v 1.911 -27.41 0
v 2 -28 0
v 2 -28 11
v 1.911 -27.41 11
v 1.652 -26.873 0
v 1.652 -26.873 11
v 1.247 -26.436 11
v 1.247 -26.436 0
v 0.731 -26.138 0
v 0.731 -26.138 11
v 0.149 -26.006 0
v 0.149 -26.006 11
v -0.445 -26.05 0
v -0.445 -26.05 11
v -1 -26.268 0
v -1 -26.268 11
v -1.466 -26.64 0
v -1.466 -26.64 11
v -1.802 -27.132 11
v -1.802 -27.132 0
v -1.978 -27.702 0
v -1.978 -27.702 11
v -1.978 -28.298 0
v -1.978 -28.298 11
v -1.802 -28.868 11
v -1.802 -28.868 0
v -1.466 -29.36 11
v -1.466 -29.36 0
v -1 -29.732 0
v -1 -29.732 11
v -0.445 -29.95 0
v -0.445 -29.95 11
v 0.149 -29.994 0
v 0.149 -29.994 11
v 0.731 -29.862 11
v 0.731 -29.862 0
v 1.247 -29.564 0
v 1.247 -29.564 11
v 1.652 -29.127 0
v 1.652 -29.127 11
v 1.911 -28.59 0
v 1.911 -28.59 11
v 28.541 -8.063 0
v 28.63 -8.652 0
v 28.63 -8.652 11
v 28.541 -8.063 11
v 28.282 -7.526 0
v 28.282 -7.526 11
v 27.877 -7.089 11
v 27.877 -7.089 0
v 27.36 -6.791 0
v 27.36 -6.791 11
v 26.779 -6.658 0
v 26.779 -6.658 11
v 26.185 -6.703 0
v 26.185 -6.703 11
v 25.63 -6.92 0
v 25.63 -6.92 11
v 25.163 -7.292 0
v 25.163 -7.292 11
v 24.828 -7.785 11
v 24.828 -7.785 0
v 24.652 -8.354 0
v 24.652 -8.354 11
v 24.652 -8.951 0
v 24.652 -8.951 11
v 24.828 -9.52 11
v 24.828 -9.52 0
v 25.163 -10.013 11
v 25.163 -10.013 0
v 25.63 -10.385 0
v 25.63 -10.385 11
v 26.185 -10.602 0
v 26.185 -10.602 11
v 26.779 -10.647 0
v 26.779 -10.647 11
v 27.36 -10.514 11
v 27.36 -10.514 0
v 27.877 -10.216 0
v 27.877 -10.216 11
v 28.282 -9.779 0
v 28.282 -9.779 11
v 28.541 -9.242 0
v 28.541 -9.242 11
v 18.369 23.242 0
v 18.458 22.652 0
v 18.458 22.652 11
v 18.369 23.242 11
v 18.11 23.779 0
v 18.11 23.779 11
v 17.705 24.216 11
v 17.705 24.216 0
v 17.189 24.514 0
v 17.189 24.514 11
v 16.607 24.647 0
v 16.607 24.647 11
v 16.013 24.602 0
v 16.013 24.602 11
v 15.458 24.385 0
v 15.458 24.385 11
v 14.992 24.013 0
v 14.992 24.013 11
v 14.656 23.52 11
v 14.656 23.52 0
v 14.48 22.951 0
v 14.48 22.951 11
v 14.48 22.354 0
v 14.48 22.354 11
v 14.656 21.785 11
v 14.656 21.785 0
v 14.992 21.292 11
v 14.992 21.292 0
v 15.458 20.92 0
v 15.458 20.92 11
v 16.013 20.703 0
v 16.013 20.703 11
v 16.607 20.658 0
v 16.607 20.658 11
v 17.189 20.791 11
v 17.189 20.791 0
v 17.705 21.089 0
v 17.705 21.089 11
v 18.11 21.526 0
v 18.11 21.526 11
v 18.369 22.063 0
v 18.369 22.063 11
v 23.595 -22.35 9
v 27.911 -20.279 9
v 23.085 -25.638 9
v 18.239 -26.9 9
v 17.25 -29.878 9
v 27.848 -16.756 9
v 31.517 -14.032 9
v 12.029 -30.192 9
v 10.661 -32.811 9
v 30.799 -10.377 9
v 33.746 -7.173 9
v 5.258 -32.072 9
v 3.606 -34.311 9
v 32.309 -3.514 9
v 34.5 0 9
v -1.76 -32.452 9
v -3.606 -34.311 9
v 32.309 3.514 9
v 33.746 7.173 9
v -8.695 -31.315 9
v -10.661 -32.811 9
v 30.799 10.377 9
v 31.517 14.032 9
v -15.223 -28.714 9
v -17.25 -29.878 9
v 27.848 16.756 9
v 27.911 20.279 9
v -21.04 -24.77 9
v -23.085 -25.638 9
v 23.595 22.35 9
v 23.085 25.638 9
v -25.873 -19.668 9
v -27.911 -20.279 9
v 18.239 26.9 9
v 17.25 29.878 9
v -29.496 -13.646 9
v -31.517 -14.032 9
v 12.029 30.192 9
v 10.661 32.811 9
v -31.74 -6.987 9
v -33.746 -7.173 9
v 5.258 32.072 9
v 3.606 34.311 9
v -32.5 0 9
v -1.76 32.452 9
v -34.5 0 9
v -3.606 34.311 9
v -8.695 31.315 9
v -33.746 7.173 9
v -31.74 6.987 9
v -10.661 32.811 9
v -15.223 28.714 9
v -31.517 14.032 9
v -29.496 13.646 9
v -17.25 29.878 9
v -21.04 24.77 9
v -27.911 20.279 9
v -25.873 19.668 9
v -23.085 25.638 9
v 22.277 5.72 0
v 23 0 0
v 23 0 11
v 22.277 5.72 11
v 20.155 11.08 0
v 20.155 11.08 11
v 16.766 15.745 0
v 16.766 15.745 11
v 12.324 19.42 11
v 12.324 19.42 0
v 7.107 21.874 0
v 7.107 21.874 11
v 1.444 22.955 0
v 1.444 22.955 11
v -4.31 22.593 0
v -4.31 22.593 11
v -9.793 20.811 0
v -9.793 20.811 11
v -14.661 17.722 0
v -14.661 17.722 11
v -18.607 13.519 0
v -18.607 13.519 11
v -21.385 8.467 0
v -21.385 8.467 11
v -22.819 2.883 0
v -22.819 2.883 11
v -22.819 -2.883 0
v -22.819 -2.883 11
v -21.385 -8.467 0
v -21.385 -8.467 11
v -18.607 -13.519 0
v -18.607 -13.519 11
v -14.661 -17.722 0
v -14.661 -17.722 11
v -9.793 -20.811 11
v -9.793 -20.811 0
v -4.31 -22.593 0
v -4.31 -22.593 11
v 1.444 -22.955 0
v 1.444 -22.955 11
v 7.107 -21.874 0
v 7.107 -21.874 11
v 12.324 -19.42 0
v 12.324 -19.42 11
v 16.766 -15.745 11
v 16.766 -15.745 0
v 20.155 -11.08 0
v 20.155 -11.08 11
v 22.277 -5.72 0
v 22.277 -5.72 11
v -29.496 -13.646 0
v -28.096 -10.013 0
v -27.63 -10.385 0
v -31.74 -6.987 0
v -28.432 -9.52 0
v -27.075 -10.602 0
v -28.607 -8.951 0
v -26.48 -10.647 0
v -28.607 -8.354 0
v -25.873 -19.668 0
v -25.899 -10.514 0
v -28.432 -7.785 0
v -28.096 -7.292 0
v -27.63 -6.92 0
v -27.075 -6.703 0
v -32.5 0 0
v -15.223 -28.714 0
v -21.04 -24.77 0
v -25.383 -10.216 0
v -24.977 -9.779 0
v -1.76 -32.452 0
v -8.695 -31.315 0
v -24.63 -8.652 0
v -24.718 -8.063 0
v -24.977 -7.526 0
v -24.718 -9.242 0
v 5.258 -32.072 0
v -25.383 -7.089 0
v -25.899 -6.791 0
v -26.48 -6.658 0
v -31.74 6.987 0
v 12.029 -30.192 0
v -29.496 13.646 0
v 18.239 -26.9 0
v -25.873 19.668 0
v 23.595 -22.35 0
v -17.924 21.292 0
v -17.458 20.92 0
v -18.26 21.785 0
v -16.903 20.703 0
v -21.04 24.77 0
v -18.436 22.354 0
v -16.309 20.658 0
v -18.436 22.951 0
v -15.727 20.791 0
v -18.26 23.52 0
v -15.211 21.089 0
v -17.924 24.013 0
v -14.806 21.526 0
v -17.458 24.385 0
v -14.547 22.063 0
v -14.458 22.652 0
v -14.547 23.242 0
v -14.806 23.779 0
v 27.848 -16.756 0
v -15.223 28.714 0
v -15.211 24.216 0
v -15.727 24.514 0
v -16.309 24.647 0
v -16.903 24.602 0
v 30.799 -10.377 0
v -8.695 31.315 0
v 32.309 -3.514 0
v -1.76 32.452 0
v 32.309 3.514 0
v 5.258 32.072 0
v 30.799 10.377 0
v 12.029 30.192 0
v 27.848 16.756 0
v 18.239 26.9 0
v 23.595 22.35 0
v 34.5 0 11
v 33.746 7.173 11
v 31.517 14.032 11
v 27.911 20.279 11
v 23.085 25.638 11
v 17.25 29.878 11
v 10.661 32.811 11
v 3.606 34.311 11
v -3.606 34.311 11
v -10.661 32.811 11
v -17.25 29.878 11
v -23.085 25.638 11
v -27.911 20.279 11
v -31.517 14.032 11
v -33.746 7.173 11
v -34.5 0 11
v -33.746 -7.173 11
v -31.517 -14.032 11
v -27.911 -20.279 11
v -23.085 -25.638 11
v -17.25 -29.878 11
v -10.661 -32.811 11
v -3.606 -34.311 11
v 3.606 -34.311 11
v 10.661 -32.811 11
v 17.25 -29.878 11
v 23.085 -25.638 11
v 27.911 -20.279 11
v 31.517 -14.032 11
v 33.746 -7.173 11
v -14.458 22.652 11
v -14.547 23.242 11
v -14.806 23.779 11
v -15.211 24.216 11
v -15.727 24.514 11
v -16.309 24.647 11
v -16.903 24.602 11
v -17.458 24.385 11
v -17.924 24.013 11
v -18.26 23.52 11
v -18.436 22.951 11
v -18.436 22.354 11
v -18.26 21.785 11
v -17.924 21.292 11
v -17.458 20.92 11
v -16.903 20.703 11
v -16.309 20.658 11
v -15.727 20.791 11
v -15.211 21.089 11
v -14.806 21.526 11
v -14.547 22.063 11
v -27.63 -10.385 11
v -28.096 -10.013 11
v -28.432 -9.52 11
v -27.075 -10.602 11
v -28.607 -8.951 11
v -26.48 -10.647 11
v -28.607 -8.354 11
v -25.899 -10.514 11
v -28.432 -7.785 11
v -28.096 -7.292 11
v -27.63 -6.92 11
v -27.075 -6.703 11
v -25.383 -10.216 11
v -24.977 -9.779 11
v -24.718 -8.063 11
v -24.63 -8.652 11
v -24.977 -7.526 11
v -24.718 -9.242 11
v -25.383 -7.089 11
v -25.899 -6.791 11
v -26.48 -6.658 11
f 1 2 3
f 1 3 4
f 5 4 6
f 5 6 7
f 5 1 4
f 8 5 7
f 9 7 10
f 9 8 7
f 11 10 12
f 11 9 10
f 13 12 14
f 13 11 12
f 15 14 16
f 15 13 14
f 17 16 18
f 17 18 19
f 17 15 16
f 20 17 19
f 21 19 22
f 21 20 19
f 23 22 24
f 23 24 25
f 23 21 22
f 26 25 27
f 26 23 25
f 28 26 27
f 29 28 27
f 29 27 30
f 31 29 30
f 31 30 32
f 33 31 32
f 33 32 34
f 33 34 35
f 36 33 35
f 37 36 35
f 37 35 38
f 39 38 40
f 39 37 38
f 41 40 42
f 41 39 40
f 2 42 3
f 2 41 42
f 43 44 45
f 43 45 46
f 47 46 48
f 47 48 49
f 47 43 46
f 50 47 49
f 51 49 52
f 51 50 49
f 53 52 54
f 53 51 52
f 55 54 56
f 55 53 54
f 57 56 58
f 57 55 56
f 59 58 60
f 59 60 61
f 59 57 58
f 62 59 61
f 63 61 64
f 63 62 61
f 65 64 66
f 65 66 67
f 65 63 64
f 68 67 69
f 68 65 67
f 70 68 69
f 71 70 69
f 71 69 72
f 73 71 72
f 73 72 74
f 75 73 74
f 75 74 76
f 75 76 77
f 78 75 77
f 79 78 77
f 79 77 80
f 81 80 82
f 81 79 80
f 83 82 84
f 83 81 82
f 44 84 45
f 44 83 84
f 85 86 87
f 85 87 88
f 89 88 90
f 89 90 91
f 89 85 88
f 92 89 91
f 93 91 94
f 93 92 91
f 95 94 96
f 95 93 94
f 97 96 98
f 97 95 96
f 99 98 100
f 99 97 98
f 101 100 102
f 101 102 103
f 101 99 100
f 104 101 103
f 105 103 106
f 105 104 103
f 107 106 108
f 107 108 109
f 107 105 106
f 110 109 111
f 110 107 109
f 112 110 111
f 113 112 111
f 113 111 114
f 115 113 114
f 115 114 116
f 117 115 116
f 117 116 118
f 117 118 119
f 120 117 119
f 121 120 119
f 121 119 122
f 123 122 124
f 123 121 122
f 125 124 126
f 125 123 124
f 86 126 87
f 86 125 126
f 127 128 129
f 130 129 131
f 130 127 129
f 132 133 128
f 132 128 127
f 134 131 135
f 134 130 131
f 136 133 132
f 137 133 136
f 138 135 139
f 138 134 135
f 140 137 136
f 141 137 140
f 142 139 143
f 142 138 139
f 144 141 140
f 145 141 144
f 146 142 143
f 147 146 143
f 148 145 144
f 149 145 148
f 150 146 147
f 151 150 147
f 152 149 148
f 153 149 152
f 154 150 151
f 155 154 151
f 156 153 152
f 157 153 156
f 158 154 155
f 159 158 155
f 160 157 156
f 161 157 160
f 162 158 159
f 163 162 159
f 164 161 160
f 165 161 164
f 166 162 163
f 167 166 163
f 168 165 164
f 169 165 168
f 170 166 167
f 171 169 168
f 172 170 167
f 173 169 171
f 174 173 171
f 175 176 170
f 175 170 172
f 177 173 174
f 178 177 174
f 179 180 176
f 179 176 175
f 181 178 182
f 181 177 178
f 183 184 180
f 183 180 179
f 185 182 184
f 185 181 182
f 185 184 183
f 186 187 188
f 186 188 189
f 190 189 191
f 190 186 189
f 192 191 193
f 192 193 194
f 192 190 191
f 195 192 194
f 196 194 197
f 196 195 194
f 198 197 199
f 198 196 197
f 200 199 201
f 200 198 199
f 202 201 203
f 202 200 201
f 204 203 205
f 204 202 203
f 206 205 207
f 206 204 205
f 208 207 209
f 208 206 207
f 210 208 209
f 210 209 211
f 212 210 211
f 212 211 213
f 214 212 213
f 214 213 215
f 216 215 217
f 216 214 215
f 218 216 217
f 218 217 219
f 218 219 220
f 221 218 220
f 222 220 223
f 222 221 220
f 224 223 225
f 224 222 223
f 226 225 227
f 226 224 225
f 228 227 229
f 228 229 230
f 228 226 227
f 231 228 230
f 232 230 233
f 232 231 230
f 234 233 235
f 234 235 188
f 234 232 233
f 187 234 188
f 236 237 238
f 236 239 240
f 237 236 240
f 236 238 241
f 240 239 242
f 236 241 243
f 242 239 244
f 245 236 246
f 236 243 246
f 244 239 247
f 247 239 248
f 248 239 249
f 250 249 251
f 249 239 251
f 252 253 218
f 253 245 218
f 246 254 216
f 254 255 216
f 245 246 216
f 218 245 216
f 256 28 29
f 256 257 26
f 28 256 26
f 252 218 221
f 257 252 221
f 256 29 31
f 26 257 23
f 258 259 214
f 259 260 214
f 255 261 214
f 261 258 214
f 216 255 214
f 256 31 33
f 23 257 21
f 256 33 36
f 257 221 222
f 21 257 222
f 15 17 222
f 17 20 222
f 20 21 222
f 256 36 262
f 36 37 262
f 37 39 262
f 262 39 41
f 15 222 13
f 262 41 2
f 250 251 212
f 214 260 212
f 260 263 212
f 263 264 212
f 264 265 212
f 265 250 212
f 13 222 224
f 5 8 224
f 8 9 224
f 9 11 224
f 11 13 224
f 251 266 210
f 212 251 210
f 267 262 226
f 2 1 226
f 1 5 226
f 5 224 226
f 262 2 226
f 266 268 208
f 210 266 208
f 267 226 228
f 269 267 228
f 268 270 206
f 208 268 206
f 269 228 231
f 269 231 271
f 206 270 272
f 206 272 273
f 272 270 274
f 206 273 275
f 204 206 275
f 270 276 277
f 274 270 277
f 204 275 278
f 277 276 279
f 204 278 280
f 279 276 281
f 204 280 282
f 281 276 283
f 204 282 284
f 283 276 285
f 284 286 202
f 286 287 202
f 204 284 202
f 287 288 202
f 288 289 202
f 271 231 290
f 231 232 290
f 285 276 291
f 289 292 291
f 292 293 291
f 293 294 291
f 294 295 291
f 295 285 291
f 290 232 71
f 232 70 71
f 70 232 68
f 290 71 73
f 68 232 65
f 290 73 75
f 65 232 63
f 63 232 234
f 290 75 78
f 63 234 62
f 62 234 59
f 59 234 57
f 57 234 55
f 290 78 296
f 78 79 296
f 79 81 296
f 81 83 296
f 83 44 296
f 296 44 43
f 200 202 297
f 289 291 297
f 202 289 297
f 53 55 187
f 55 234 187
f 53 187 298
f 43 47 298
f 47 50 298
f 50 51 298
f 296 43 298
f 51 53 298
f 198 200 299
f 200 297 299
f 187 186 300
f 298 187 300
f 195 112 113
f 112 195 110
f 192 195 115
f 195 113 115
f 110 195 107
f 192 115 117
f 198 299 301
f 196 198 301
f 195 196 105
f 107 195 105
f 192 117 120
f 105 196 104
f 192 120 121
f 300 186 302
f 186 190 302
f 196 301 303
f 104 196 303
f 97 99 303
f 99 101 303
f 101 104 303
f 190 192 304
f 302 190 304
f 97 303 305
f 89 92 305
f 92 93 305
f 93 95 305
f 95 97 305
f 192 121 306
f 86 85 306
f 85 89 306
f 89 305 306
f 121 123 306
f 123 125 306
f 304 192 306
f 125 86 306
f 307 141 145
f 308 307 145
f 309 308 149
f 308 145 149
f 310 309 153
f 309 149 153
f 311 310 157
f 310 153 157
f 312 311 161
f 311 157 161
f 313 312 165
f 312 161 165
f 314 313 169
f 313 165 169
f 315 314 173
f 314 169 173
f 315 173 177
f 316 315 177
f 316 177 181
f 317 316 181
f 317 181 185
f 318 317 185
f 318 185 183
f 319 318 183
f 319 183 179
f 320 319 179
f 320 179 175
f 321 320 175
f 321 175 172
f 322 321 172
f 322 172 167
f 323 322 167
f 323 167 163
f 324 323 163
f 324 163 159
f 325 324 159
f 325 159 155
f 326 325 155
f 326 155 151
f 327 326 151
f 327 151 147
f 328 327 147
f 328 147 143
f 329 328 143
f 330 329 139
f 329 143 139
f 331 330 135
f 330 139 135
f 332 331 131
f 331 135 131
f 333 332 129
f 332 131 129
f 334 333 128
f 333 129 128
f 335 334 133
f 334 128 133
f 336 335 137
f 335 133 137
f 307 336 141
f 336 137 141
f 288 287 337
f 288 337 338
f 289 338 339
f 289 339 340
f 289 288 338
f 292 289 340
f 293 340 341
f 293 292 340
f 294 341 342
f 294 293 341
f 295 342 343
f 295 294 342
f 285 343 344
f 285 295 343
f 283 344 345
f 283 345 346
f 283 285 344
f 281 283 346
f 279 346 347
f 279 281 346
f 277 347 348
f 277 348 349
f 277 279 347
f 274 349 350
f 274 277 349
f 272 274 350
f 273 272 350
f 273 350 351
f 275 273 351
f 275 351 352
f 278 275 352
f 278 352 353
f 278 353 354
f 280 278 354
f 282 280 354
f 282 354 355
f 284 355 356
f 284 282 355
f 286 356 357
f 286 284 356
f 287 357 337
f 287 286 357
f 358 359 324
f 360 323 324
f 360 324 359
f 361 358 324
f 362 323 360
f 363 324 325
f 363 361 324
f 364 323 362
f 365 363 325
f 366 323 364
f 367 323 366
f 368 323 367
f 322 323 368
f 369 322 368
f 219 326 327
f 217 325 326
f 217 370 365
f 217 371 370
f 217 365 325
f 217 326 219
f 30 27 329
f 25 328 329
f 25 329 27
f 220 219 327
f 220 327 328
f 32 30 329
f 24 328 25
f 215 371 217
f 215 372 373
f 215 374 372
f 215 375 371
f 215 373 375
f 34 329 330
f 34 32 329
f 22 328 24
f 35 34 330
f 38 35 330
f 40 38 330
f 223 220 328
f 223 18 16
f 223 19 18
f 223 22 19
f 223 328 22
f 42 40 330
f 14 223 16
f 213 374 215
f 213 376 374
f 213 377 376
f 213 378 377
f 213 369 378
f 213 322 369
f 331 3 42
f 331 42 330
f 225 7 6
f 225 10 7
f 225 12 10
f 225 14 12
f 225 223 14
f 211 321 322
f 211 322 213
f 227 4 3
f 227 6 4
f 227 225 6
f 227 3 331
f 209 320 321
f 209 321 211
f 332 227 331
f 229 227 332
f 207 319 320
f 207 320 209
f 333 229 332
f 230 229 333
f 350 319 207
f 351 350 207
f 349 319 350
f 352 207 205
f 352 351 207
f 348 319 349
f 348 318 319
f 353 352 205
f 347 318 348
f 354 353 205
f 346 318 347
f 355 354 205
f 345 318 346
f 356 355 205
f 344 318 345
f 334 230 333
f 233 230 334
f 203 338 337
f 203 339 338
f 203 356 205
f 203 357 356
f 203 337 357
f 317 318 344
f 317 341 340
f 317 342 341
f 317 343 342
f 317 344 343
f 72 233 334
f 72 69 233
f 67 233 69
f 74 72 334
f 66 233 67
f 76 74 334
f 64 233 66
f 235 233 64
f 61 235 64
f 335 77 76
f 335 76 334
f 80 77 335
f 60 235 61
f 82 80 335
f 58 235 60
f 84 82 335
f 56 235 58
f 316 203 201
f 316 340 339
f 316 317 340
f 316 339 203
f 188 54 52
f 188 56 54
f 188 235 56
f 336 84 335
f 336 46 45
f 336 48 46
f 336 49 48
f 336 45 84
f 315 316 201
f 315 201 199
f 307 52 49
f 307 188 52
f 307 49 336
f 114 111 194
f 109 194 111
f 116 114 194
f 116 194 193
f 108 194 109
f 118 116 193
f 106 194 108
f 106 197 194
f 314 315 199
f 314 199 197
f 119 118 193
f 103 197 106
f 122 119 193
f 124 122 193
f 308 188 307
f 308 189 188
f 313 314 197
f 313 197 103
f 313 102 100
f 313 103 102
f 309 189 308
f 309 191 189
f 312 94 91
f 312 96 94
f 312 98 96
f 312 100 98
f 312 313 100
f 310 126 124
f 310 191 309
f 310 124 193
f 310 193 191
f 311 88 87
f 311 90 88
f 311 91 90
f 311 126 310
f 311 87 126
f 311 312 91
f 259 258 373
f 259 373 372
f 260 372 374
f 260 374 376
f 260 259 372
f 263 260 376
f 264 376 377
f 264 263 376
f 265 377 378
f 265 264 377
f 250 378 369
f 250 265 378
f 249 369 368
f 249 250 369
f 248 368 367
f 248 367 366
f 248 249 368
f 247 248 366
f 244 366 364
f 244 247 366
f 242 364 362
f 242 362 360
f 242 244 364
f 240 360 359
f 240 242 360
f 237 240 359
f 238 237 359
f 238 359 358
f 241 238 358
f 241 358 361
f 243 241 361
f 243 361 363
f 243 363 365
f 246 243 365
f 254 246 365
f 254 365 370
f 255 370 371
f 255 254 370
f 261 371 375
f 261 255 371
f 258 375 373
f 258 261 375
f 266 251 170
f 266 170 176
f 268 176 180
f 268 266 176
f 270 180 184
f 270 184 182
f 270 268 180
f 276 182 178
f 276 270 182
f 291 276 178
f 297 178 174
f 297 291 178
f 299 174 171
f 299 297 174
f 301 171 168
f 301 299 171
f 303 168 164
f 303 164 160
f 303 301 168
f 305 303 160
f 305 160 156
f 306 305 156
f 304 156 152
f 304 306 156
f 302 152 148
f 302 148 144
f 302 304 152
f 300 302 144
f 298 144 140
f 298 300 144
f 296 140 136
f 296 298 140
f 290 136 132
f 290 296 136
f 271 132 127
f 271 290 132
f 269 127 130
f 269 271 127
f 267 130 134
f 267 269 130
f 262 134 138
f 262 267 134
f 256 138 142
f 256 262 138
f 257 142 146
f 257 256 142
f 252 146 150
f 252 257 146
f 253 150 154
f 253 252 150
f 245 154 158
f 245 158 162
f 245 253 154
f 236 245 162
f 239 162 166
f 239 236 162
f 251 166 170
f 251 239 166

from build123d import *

# Parameters (mm, degrees)
SKETCH_1_R          = 34.5
SKETCH_1_R_2        = 23
SKETCH_1_R_3        = 2
EXTRUDE_1_DEPTH     = 11
SKETCH_2_R          = 34.5
SKETCH_2_R_2        = 32.5
CUT_EXTRUDE_1_DEPTH = 9


with BuildPart() as part:
    # 草图1 → 凸台-拉伸1 (new body)
    with BuildSketch(Plane.XY):
        Circle(SKETCH_1_R)
        Circle(SKETCH_1_R_2, mode=Mode.SUBTRACT)
        with Locations((0, -28)):
            Circle(SKETCH_1_R_3, mode=Mode.SUBTRACT)
        with Locations((-26.629582456, -8.652475842)):
            Circle(SKETCH_1_R_3, mode=Mode.SUBTRACT)
        with Locations((-16.457987064, 22.652475842)):
            Circle(SKETCH_1_R_3, mode=Mode.SUBTRACT)
        with Locations((16.457987064, 22.652475842)):
            Circle(SKETCH_1_R_3, mode=Mode.SUBTRACT)
        with Locations((26.629582456, -8.652475842)):
            Circle(SKETCH_1_R_3, mode=Mode.SUBTRACT)
    extrude(amount=EXTRUDE_1_DEPTH)

    # 草图2 → 切除-拉伸1 (cut)
    with BuildSketch(Plane(origin=(0, 0, 0), x_dir=(-1, 0, 0), z_dir=(0, 0, -1))):
        Circle(SKETCH_2_R)
        Circle(SKETCH_2_R_2, mode=Mode.SUBTRACT)
    extrude(amount=-CUT_EXTRUDE_1_DEPTH, mode=Mode.SUBTRACT)


solid = part.part
